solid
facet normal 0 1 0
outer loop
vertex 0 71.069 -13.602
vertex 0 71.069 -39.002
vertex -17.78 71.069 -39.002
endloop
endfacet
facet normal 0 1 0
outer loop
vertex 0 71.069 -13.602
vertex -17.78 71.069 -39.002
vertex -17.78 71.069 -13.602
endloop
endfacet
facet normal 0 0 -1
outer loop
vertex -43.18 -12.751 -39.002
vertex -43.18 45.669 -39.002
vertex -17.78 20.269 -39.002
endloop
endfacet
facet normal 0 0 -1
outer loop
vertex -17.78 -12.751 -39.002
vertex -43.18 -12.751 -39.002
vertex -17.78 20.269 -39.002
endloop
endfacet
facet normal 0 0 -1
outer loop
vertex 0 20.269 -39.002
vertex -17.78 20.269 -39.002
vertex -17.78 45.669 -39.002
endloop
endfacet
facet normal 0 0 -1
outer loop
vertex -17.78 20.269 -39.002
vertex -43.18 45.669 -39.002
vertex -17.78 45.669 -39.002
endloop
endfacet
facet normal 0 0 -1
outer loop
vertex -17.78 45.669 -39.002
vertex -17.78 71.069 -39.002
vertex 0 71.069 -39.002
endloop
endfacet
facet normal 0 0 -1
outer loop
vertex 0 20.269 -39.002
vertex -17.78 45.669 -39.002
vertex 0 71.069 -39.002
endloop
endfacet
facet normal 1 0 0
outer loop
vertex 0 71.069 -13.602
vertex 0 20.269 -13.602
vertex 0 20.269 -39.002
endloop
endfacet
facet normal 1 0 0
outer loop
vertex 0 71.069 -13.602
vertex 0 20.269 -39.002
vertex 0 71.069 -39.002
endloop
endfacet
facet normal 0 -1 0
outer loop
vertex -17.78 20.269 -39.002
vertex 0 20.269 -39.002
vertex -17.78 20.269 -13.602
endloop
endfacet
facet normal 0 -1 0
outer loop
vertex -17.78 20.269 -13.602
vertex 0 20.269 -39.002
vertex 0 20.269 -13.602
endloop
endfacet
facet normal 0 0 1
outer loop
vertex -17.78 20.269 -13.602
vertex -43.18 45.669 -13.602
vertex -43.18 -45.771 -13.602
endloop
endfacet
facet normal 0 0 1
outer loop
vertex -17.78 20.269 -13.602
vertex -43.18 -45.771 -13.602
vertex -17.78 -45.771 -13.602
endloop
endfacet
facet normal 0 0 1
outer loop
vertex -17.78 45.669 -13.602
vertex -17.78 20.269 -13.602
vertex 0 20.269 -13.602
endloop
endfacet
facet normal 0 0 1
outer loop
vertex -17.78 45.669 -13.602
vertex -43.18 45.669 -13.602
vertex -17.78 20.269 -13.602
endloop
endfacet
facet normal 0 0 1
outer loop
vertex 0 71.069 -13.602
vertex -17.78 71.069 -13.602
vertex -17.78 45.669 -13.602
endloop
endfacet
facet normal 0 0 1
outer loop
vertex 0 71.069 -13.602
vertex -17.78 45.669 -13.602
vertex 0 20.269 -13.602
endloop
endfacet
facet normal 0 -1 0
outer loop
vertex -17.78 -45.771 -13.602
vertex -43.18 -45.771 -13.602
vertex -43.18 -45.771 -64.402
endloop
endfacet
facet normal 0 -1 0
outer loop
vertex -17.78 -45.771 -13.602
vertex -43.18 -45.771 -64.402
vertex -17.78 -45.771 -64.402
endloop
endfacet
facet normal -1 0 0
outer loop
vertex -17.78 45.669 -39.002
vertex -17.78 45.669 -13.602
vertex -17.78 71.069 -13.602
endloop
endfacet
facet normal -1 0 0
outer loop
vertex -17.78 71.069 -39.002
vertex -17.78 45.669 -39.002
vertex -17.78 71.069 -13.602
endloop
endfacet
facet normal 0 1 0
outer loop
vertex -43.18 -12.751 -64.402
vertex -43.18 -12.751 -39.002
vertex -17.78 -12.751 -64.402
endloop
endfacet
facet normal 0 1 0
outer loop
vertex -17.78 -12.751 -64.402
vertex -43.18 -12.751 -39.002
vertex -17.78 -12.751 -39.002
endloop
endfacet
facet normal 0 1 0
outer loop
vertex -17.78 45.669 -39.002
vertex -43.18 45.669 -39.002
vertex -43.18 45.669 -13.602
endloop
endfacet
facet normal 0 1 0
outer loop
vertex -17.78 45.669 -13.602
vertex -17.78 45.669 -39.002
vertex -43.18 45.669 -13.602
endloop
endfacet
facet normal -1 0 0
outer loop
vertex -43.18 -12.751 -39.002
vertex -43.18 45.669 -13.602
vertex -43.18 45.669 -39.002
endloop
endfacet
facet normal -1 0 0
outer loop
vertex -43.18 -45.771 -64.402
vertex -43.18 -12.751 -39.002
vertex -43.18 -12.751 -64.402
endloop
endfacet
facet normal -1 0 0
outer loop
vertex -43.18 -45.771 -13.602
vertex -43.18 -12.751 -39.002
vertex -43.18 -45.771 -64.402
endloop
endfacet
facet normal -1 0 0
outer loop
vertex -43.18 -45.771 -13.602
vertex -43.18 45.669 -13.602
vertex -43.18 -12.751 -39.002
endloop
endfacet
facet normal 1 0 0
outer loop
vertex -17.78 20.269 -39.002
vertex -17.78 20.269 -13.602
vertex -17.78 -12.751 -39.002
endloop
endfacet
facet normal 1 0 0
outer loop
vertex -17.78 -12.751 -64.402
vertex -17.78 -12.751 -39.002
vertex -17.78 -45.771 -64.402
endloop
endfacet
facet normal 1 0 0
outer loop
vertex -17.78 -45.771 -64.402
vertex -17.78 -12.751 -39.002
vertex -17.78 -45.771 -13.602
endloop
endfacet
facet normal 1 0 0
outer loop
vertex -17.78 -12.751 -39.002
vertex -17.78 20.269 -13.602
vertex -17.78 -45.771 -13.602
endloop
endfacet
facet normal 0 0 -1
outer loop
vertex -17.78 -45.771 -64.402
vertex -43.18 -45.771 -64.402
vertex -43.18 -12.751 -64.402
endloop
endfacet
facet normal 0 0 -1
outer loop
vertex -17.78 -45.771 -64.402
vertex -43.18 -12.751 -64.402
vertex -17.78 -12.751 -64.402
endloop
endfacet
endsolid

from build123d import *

# Parameters (mm, degrees)
F0_W     = 25.4
F0_H     = 25.4
F1_DEPTH = 17.78
F2_DEPTH = 43.18
F3_W     = 25.4
F3_H     = 25.4
F4_DEPTH = 66.04
F5_W     = 25.4
F5_H     = 33.02
F6_DEPTH = 25.4


with BuildPart() as f1:
    # F0 (on Right) → F1 (new body)
    with BuildSketch(Plane.YZ):
        with Locations((58.3694662571, -26.3017169727)):
            Rectangle(F0_W, F0_H)
    extrude(amount=-F1_DEPTH)

    # F0 (on Right) → F2 (join)
    with BuildSketch(Plane.YZ):
        with Locations((32.9694662571, -26.3017169727)):
            Rectangle(F0_W, F0_H)
    extrude(amount=-F2_DEPTH)

    # F3 (on face) → F4 (join)
    with BuildSketch(Plane.XZ.offset(-20.2694662571)):
        with Locations((-30.48, -26.3017169727)):
            Rectangle(F3_W, F3_H)
    extrude(amount=F4_DEPTH)

    # F5 (on face) → F6 (join)
    with BuildSketch(Plane(origin=(0, 0, -39.0017169727), x_dir=(1, 0, 0), z_dir=(0, 0, -1))):
        with Locations((-30.48, 29.2605337429)):
            Rectangle(F5_W, F5_H)
    extrude(amount=F6_DEPTH)


solid = f1.part
